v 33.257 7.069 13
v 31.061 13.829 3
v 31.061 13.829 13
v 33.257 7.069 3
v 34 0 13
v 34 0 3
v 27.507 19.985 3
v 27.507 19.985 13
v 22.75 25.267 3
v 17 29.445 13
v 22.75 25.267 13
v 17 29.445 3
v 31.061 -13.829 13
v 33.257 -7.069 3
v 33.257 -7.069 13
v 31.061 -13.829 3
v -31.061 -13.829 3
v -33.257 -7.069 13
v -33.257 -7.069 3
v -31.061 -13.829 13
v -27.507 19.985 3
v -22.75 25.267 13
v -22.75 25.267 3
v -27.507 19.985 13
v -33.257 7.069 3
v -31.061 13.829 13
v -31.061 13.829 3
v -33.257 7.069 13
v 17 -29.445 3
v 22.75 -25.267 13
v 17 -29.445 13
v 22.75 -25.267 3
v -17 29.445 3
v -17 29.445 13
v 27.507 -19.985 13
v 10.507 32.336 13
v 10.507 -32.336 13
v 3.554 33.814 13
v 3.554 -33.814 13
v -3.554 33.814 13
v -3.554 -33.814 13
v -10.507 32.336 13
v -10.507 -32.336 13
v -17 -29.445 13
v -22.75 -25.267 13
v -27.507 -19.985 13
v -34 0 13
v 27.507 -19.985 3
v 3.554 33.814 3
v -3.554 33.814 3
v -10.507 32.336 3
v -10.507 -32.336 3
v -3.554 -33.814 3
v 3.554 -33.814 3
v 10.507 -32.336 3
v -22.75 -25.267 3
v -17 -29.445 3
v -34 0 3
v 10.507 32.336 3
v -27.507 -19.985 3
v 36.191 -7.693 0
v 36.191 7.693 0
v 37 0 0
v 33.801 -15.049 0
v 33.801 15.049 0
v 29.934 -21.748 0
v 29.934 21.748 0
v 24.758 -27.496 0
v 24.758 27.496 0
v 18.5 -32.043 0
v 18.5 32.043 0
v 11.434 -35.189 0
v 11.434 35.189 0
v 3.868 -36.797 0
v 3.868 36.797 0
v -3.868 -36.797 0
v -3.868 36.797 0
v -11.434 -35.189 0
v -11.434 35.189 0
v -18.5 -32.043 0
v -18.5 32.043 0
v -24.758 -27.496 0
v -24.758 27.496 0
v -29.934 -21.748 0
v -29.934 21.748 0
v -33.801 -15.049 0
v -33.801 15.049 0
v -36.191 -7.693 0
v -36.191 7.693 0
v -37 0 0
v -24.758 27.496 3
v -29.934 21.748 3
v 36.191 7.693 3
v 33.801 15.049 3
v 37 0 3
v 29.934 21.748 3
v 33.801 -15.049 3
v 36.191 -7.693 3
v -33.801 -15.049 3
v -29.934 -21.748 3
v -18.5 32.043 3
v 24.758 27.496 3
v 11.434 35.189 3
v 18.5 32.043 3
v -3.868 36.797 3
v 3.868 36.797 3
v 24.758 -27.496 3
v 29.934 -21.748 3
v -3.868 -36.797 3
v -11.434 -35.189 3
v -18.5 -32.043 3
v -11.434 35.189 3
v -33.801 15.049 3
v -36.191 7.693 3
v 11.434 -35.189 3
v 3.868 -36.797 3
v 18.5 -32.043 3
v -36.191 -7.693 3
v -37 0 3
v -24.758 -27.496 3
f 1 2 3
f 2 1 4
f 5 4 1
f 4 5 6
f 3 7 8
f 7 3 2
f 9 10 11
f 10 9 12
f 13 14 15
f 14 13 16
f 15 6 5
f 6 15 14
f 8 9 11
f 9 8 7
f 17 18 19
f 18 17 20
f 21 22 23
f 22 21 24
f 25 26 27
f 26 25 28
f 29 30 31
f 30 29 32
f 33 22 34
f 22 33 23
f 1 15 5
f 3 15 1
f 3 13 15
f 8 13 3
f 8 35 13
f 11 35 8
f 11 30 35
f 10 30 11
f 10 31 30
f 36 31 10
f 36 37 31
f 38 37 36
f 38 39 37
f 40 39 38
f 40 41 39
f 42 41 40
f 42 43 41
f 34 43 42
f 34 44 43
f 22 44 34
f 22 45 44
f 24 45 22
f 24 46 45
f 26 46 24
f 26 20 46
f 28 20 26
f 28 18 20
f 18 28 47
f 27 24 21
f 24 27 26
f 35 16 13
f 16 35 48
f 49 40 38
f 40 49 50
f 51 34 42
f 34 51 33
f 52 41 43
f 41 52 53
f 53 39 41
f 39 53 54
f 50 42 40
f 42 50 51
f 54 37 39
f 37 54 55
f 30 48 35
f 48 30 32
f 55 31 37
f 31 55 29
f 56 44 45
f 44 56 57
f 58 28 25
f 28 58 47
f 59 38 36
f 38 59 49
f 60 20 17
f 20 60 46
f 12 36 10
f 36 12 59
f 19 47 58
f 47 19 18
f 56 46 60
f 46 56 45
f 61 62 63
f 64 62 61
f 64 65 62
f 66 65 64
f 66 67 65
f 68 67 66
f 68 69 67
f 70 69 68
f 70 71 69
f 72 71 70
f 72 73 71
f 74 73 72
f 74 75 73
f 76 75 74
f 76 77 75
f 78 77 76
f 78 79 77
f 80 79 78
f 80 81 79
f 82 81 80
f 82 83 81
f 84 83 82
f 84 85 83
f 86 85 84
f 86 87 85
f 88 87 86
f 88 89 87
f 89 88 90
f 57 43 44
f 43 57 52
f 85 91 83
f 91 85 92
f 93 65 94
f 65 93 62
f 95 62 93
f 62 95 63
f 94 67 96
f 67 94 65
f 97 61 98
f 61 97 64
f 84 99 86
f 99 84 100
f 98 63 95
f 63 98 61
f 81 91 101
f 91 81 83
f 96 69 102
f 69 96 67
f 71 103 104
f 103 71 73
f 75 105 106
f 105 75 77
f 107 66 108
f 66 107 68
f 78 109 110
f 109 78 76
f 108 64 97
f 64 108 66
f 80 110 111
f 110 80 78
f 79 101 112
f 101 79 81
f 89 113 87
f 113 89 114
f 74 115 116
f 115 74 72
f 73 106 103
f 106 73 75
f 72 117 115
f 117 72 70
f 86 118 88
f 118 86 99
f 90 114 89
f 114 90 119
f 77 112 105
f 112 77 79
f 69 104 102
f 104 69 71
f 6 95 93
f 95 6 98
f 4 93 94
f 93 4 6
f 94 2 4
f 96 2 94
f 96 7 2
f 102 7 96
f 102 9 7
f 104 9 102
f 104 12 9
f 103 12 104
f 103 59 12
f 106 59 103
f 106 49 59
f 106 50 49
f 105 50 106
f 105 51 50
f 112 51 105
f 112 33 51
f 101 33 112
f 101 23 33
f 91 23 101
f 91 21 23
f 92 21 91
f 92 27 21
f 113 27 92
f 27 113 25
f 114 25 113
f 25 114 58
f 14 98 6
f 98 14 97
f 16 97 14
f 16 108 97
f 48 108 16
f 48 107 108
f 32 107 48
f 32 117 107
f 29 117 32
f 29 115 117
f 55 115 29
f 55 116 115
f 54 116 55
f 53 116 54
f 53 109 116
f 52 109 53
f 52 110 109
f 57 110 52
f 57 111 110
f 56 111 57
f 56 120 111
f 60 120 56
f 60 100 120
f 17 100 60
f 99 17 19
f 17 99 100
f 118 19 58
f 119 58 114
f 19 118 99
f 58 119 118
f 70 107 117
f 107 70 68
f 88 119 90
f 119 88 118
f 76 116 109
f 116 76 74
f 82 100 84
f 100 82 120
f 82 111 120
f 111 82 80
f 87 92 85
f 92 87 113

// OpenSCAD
//// measures in mm


 union(){
    cylinder(h=13, r = 68/2, center=false);
    cylinder(h=3, r = 68/2+3, center=false);
     
 }
 
